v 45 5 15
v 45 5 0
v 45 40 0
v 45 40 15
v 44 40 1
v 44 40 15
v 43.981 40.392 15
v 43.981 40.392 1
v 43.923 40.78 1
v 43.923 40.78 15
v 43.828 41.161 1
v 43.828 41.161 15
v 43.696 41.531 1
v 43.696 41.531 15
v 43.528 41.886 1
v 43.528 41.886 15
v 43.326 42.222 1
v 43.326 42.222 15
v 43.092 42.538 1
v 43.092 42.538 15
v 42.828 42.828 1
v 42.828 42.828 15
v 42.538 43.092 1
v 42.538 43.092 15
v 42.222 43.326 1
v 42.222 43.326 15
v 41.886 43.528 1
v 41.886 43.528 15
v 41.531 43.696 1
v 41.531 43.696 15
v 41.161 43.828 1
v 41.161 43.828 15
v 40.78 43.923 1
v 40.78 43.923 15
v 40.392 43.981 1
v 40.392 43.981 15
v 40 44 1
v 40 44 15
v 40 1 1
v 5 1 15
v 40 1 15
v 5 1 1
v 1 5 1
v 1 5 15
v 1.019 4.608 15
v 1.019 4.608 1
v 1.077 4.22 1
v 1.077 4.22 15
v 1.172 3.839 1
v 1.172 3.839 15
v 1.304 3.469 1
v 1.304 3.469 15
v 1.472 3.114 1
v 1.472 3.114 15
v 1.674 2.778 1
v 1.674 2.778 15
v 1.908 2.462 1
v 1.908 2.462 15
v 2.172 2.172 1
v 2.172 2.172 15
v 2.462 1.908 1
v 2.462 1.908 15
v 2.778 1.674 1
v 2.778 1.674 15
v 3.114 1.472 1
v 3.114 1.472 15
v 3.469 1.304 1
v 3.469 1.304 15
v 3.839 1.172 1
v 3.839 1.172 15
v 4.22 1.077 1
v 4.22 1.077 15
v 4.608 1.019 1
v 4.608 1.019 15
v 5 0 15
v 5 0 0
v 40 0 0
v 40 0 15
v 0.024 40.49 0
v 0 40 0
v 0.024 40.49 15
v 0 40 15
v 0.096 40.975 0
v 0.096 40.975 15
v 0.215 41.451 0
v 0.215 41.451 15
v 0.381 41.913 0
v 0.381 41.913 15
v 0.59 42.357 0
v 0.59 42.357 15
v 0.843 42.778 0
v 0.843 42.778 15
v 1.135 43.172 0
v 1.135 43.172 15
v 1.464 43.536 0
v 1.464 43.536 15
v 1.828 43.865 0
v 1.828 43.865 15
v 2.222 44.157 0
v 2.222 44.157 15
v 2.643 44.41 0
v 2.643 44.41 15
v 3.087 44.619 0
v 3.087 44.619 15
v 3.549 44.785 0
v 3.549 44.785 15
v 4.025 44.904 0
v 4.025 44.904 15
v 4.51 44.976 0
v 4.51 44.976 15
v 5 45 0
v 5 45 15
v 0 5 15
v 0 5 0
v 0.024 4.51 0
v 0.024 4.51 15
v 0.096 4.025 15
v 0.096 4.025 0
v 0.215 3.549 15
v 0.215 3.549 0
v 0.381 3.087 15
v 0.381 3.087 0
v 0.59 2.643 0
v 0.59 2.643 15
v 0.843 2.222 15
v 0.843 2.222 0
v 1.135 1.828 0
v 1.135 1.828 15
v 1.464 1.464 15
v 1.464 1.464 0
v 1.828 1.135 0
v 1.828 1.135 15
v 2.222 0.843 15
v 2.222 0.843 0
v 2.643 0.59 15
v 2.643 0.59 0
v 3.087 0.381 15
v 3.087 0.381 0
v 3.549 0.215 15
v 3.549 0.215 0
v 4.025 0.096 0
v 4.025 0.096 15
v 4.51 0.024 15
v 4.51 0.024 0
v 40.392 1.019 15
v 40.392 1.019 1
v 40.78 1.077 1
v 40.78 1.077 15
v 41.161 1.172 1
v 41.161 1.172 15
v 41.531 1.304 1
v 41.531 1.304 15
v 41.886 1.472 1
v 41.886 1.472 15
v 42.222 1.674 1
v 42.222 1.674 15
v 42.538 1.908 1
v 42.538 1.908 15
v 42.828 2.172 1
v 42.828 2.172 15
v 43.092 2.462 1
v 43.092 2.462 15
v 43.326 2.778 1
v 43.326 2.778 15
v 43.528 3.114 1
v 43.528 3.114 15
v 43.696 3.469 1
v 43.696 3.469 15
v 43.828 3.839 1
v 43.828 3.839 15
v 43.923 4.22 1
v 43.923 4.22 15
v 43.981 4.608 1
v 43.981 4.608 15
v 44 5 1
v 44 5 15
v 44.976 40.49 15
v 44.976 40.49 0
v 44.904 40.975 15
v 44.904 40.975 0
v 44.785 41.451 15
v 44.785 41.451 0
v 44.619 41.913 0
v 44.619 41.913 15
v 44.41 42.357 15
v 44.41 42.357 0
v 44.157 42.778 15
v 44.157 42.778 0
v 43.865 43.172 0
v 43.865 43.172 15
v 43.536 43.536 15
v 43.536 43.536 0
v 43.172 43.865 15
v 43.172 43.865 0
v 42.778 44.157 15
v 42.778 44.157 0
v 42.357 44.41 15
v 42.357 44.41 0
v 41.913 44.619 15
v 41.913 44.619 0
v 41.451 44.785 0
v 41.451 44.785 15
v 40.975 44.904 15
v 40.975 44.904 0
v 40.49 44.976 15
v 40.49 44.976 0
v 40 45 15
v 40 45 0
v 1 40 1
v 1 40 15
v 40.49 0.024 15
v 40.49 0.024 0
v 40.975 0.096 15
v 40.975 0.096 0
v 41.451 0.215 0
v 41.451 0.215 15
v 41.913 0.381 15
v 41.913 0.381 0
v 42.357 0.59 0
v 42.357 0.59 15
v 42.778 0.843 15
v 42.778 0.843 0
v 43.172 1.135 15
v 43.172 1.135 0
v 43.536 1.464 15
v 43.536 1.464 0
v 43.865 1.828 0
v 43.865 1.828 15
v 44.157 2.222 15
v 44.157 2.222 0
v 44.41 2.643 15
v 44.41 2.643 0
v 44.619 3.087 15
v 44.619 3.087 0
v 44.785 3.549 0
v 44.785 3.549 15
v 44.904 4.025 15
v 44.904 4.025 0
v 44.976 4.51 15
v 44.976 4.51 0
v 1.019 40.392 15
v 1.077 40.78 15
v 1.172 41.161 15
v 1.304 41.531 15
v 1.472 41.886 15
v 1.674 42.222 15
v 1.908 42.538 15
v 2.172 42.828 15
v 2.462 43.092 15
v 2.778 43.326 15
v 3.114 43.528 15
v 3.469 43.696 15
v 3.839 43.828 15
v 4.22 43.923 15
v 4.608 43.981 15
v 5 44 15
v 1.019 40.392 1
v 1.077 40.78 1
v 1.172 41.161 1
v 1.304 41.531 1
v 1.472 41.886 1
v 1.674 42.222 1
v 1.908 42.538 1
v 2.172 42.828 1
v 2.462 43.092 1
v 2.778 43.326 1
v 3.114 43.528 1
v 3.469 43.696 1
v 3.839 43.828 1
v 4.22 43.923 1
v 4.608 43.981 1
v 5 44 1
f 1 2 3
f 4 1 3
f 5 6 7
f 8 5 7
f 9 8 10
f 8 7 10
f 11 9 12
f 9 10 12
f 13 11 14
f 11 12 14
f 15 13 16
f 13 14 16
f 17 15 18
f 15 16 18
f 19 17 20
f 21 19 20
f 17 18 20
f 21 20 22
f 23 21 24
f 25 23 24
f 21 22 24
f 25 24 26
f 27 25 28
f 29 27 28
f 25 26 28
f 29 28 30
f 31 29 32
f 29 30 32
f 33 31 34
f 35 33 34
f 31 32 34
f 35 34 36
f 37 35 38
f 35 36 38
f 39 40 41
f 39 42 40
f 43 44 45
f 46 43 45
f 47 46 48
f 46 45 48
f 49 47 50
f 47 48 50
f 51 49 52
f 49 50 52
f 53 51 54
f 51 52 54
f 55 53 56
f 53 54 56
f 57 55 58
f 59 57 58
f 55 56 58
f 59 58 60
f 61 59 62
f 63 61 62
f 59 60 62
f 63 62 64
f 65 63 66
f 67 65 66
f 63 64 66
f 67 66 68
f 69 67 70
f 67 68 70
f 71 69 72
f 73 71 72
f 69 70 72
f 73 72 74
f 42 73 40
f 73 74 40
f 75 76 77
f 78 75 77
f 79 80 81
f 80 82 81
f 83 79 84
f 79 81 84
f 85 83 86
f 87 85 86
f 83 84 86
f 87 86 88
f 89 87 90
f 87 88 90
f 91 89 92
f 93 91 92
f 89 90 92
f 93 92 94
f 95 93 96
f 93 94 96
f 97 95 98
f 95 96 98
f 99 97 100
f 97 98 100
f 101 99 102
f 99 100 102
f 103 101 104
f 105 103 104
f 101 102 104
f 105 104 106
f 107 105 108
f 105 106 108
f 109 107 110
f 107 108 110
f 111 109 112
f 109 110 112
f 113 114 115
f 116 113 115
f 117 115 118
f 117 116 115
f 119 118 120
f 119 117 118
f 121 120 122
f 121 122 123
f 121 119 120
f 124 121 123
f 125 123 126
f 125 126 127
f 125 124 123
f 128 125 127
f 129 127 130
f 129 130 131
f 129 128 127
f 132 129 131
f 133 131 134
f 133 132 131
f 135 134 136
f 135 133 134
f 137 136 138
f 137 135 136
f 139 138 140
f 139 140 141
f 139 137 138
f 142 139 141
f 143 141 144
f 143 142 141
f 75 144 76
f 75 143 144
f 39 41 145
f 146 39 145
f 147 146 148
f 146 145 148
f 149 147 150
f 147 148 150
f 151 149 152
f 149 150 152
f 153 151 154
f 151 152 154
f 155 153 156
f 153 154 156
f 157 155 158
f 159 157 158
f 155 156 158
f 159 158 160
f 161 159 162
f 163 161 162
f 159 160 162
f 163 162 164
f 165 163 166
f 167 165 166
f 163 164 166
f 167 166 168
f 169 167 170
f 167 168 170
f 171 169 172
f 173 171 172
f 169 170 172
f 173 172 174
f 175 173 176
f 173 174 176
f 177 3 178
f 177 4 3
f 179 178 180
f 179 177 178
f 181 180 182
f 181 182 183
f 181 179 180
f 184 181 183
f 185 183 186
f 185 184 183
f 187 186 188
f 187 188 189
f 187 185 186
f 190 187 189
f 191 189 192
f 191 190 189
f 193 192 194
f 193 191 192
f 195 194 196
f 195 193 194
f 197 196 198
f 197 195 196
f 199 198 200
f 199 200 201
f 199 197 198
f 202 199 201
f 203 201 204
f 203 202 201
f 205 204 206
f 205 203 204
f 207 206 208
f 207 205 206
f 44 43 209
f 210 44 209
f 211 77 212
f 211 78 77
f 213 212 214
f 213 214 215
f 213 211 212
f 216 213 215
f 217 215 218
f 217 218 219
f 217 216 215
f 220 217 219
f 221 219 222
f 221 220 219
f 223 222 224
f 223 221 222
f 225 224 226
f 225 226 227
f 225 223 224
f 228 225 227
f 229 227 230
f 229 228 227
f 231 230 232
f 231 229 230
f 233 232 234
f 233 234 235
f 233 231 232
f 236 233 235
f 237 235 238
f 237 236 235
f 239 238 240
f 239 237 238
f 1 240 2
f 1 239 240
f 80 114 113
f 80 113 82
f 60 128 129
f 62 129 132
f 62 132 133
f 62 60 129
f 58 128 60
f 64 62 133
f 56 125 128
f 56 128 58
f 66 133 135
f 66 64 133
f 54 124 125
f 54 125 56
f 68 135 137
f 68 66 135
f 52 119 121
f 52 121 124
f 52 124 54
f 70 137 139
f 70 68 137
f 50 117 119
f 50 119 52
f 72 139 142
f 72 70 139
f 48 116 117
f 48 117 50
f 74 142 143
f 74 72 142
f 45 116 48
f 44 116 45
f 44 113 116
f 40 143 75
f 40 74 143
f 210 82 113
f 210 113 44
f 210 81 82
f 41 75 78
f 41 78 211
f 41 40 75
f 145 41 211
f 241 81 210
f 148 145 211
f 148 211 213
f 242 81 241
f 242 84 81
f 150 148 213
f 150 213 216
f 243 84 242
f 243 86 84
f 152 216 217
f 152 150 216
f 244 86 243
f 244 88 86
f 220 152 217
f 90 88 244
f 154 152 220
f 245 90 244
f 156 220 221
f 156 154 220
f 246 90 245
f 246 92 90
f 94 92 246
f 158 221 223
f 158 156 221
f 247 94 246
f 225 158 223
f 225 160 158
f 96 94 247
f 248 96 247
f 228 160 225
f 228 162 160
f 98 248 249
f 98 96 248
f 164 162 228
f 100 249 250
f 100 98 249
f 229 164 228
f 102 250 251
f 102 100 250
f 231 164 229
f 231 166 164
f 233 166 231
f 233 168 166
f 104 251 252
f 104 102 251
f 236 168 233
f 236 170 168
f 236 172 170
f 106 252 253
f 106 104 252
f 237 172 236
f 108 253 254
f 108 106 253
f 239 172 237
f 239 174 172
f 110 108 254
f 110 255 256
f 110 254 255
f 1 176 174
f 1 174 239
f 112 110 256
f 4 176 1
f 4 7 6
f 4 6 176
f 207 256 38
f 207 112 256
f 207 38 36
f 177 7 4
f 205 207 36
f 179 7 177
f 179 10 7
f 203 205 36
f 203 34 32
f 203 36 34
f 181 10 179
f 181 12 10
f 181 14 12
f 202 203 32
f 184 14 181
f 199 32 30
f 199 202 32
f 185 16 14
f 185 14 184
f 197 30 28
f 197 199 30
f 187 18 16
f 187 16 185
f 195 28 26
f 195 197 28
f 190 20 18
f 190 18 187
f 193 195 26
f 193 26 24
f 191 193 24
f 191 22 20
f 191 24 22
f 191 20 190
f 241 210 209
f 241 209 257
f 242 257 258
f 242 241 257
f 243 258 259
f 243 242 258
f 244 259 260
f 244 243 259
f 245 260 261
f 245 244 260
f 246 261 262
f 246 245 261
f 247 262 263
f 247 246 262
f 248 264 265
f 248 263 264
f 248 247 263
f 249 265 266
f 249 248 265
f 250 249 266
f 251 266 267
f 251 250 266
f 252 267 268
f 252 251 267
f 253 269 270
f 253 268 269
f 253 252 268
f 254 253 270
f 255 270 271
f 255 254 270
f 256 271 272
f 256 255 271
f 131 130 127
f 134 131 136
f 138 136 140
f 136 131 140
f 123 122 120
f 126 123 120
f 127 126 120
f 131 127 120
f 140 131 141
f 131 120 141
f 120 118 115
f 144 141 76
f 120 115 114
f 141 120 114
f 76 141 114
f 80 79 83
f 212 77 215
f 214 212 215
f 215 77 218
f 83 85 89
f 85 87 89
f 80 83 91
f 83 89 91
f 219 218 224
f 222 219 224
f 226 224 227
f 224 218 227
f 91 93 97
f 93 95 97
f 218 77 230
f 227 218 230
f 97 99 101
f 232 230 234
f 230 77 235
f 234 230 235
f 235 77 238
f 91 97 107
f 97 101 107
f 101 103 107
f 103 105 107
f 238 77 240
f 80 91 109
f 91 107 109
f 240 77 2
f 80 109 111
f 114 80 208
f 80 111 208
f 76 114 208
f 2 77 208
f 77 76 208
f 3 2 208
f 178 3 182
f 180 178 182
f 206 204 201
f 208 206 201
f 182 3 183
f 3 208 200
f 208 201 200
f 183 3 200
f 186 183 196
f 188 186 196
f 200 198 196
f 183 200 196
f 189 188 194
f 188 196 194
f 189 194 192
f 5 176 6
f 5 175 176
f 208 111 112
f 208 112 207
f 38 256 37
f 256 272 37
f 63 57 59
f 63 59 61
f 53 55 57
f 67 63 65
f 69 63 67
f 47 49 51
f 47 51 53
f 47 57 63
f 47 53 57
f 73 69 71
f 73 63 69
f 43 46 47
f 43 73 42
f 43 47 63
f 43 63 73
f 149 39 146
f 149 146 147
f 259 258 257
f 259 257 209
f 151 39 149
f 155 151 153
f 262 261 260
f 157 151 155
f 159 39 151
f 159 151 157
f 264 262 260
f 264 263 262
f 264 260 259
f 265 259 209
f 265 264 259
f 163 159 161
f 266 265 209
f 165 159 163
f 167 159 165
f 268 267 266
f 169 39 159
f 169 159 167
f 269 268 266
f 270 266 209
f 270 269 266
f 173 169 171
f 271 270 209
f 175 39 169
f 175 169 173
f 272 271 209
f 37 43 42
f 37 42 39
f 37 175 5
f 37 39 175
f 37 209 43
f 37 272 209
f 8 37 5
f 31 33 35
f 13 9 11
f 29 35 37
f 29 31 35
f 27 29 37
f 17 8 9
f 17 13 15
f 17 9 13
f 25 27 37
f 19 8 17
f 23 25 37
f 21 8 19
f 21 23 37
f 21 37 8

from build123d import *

# Parameters (mm, degrees)
SKETCH1_W           = 45
SKETCH1_H           = 45
BOSS_EXTRUDE1_DEPTH = 15
FILLET1_R           = 5
SHELL1_T            = -1


with BuildPart() as part:
    # Sketch1 → Boss-Extrude1 (new body)
    with BuildSketch(Plane.XY):
        with Locations((22.5, 22.5)):
            Rectangle(SKETCH1_W, SKETCH1_H)
    extrude(amount=BOSS_EXTRUDE1_DEPTH)

    # Fillet1
    fillet1_edges = [part.edges().sort_by_distance(p)[0] for p in [
        (0, 45, 7.5),
        (45, 45, 7.5),
        (45, 0, 7.5),
        (0, 0, 7.5),
    ]]
    fillet(fillet1_edges, radius=FILLET1_R)

    # Shell1
    shell1_openings = [part.faces().sort_by_distance(p)[0] for p in [
        (22.5, 22.5, 15),
    ]]
    offset(amount=SHELL1_T, openings=shell1_openings, kind=Kind.INTERSECTION)


solid = part.part
